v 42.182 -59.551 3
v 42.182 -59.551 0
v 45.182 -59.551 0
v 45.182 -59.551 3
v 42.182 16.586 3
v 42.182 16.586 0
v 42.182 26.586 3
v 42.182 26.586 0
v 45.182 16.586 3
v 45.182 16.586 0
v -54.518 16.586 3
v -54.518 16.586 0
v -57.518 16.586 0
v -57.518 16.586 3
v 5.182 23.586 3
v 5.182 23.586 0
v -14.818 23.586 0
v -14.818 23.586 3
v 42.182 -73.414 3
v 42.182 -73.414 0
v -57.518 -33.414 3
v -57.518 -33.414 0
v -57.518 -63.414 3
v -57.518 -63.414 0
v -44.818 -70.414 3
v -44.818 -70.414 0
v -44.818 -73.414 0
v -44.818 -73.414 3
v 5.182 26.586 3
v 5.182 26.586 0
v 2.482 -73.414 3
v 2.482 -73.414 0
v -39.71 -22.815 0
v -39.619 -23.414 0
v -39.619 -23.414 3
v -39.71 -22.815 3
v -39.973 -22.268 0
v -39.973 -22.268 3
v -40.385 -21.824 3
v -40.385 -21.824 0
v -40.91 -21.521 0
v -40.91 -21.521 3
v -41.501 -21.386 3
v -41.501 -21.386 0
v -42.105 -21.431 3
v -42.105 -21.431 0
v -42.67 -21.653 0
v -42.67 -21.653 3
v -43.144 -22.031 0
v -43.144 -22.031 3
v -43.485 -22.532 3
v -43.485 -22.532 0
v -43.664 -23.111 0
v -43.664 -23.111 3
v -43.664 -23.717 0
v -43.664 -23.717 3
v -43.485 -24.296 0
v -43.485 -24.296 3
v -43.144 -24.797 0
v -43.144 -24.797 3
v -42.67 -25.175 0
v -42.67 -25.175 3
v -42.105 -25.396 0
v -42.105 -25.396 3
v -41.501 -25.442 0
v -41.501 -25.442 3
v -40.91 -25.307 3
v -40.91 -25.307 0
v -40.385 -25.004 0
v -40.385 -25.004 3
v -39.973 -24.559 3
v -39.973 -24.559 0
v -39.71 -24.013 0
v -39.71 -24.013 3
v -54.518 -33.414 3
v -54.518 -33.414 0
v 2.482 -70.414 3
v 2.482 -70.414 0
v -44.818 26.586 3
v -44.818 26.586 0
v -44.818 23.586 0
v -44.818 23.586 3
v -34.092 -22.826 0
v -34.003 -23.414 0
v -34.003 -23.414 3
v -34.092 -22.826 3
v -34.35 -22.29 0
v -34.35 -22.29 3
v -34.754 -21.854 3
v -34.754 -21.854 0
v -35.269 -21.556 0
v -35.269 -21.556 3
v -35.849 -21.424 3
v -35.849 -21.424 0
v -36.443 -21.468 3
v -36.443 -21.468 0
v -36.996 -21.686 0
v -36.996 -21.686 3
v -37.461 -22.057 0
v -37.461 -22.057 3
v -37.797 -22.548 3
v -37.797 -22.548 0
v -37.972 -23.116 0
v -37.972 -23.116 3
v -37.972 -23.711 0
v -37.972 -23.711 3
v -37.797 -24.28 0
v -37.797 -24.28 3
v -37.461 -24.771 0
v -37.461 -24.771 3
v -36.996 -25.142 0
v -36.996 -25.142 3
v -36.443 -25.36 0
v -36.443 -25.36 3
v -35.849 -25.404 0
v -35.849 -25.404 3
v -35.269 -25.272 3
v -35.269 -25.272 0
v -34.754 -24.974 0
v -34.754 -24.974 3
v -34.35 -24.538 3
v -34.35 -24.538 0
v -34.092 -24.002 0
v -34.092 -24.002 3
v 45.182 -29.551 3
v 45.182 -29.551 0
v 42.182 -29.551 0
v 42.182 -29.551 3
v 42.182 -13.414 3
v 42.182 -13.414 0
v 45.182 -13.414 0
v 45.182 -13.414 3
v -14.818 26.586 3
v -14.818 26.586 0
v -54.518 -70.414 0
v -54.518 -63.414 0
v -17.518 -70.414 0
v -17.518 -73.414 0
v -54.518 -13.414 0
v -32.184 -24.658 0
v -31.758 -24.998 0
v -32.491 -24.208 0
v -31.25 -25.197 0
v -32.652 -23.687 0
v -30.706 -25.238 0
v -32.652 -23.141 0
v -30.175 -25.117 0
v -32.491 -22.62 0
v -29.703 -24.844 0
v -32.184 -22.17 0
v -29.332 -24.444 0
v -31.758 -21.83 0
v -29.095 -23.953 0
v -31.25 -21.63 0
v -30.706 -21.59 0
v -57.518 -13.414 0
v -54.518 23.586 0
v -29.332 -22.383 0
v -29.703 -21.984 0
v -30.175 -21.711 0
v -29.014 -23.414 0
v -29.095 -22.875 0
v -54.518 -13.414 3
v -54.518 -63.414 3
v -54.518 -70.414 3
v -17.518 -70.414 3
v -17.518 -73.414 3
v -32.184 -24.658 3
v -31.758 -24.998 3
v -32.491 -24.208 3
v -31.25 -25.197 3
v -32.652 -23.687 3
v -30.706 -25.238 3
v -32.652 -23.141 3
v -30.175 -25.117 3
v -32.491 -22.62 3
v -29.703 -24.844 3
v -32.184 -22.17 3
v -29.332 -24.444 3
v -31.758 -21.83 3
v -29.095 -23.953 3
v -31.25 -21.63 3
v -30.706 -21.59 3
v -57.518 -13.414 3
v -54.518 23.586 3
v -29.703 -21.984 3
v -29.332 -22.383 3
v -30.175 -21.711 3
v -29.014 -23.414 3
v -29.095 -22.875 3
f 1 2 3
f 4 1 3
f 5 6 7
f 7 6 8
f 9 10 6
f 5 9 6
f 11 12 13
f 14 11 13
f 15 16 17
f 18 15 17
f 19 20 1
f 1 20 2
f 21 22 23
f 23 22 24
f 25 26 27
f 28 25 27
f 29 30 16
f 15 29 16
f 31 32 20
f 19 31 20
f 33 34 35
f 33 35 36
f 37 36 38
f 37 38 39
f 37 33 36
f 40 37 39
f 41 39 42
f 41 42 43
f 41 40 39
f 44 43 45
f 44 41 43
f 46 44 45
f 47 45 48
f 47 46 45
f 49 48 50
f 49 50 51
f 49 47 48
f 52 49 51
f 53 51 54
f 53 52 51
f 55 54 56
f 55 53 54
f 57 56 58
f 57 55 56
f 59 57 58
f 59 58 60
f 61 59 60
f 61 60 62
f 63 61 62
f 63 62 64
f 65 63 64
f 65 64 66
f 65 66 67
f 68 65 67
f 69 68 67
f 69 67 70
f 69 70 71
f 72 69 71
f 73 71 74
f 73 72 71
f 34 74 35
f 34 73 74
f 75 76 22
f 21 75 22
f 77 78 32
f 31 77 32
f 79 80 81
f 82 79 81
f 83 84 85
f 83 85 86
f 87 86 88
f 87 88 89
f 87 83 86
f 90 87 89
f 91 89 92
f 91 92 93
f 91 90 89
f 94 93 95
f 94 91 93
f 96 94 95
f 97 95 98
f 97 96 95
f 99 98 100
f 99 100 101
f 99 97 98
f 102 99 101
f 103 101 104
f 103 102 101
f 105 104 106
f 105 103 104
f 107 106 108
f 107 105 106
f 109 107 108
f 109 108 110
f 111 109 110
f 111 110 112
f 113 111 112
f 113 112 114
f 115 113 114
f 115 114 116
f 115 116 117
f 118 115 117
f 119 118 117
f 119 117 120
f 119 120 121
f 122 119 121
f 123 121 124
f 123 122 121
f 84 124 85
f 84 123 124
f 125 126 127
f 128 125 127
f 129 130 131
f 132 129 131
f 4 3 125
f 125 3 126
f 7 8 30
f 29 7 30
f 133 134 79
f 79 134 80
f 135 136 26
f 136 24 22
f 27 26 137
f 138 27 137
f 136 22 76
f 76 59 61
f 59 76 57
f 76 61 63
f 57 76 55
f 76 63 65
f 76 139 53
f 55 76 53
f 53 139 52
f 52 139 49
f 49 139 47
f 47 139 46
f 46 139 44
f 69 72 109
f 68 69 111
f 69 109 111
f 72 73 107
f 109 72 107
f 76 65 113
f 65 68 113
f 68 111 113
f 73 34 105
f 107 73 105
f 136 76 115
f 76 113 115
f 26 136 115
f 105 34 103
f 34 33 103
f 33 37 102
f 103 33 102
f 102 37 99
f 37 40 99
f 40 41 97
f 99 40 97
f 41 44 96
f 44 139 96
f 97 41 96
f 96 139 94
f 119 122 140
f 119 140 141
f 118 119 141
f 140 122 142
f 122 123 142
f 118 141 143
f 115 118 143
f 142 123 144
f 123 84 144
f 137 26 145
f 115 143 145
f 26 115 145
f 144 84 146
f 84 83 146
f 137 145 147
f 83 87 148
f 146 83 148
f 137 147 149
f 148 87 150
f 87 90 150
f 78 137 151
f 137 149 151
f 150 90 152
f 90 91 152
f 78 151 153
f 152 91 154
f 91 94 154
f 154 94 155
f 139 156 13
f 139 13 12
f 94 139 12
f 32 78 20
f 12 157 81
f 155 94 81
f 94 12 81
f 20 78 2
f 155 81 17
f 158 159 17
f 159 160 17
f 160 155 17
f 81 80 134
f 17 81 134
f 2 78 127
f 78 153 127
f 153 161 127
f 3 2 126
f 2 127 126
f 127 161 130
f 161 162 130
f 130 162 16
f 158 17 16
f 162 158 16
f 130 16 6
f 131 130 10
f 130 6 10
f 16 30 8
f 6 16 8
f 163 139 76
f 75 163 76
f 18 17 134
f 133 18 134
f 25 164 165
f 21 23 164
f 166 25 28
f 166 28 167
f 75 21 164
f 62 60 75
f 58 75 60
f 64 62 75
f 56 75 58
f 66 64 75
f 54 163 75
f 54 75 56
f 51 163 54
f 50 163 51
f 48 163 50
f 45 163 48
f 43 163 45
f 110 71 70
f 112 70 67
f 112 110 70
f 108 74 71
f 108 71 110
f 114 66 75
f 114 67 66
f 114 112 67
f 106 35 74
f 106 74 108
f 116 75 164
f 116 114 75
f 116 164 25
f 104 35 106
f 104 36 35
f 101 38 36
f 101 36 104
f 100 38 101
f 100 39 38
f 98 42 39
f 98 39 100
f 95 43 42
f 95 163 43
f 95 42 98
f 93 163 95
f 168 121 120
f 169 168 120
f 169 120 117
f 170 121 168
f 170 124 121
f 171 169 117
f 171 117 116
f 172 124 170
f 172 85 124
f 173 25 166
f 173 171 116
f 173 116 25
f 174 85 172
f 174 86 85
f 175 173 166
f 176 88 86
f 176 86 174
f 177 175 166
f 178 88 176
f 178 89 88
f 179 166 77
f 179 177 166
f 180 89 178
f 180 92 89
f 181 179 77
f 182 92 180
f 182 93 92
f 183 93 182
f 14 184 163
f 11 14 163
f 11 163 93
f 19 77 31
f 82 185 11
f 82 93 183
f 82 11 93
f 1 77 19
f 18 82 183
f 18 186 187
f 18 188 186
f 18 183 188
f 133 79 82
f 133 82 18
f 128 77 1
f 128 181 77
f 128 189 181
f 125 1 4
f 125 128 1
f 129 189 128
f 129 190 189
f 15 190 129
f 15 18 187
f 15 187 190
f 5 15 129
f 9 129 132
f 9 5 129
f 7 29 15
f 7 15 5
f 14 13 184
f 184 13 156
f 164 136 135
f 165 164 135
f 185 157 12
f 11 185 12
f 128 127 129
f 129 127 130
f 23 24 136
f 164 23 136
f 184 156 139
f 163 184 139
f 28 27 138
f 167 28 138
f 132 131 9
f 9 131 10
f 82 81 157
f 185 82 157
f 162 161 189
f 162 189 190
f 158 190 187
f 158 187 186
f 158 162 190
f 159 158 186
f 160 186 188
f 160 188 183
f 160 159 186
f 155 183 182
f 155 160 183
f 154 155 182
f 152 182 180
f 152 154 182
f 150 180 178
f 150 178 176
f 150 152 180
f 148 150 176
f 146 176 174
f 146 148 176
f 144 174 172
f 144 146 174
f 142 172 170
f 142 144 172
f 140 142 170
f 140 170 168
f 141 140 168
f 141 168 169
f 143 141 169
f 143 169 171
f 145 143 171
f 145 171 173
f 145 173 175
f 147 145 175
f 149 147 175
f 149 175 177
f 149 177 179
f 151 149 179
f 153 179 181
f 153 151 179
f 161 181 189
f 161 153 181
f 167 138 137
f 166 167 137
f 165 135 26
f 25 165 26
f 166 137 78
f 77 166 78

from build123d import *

# Parameters (mm, degrees)
ESQUISSE1_R        = 2.033472286
ESQUISSE1_R_2      = 1.995646952
ESQUISSE1_R_3      = 1.82934304
BOSS_EXTRU_1_DEPTH = 3


with BuildPart() as part:
    # Esquisse1 → Boss.-Extru.1 (new body)
    with BuildSketch(Plane.XY):
        Polygon((-54.518120274, -33.413932292), (-57.518120274, -33.413932292), (-57.518120274, -63.413932292), (-54.518120274, -63.413932292), (-54.518120274, -70.413932292), (-44.818120274, -70.413932292), (-44.818120274, -73.413932292), (-17.518120274, -73.413932292), (-17.518120274, -70.413932292), (2.481879726, -70.413932292), (2.481879726, -73.413932292), (32.481879726, -73.413932292), (42.181879726, -73.413932292), (42.181879726, -59.550988322), (45.181879726, -59.550988322), (45.181879726, -29.550988322), (42.181879726, -29.550988322), (42.181879726, -13.413932292), (45.181879726, -13.413932292), (45.181879726, 16.586067708), (42.181879726, 16.586067708), (42.181879726, 26.586067708), (29.835043292, 26.586067708), (5.181879726, 26.586067708), (5.181879726, 23.586067708), (-14.818120274, 23.586067708), (-14.818120274, 26.586067708), (-44.818120274, 26.586067708), (-44.818120274, 23.586067708), (-54.518120274, 23.586067708), (-54.518120274, 16.586067708), (-57.518120274, 16.586067708), (-57.518120274, -13.413932292), (-54.518120274, -13.413932292), align=None)
        with Locations((-41.652875269, -23.413932292)):
            Circle(ESQUISSE1_R, mode=Mode.SUBTRACT)
        with Locations((-35.998542238, -23.413932292)):
            Circle(ESQUISSE1_R_2, mode=Mode.SUBTRACT)
        with Locations((-30.843120944, -23.413932292)):
            Circle(ESQUISSE1_R_3, mode=Mode.SUBTRACT)
    extrude(amount=BOSS_EXTRU_1_DEPTH)


solid = part.part
